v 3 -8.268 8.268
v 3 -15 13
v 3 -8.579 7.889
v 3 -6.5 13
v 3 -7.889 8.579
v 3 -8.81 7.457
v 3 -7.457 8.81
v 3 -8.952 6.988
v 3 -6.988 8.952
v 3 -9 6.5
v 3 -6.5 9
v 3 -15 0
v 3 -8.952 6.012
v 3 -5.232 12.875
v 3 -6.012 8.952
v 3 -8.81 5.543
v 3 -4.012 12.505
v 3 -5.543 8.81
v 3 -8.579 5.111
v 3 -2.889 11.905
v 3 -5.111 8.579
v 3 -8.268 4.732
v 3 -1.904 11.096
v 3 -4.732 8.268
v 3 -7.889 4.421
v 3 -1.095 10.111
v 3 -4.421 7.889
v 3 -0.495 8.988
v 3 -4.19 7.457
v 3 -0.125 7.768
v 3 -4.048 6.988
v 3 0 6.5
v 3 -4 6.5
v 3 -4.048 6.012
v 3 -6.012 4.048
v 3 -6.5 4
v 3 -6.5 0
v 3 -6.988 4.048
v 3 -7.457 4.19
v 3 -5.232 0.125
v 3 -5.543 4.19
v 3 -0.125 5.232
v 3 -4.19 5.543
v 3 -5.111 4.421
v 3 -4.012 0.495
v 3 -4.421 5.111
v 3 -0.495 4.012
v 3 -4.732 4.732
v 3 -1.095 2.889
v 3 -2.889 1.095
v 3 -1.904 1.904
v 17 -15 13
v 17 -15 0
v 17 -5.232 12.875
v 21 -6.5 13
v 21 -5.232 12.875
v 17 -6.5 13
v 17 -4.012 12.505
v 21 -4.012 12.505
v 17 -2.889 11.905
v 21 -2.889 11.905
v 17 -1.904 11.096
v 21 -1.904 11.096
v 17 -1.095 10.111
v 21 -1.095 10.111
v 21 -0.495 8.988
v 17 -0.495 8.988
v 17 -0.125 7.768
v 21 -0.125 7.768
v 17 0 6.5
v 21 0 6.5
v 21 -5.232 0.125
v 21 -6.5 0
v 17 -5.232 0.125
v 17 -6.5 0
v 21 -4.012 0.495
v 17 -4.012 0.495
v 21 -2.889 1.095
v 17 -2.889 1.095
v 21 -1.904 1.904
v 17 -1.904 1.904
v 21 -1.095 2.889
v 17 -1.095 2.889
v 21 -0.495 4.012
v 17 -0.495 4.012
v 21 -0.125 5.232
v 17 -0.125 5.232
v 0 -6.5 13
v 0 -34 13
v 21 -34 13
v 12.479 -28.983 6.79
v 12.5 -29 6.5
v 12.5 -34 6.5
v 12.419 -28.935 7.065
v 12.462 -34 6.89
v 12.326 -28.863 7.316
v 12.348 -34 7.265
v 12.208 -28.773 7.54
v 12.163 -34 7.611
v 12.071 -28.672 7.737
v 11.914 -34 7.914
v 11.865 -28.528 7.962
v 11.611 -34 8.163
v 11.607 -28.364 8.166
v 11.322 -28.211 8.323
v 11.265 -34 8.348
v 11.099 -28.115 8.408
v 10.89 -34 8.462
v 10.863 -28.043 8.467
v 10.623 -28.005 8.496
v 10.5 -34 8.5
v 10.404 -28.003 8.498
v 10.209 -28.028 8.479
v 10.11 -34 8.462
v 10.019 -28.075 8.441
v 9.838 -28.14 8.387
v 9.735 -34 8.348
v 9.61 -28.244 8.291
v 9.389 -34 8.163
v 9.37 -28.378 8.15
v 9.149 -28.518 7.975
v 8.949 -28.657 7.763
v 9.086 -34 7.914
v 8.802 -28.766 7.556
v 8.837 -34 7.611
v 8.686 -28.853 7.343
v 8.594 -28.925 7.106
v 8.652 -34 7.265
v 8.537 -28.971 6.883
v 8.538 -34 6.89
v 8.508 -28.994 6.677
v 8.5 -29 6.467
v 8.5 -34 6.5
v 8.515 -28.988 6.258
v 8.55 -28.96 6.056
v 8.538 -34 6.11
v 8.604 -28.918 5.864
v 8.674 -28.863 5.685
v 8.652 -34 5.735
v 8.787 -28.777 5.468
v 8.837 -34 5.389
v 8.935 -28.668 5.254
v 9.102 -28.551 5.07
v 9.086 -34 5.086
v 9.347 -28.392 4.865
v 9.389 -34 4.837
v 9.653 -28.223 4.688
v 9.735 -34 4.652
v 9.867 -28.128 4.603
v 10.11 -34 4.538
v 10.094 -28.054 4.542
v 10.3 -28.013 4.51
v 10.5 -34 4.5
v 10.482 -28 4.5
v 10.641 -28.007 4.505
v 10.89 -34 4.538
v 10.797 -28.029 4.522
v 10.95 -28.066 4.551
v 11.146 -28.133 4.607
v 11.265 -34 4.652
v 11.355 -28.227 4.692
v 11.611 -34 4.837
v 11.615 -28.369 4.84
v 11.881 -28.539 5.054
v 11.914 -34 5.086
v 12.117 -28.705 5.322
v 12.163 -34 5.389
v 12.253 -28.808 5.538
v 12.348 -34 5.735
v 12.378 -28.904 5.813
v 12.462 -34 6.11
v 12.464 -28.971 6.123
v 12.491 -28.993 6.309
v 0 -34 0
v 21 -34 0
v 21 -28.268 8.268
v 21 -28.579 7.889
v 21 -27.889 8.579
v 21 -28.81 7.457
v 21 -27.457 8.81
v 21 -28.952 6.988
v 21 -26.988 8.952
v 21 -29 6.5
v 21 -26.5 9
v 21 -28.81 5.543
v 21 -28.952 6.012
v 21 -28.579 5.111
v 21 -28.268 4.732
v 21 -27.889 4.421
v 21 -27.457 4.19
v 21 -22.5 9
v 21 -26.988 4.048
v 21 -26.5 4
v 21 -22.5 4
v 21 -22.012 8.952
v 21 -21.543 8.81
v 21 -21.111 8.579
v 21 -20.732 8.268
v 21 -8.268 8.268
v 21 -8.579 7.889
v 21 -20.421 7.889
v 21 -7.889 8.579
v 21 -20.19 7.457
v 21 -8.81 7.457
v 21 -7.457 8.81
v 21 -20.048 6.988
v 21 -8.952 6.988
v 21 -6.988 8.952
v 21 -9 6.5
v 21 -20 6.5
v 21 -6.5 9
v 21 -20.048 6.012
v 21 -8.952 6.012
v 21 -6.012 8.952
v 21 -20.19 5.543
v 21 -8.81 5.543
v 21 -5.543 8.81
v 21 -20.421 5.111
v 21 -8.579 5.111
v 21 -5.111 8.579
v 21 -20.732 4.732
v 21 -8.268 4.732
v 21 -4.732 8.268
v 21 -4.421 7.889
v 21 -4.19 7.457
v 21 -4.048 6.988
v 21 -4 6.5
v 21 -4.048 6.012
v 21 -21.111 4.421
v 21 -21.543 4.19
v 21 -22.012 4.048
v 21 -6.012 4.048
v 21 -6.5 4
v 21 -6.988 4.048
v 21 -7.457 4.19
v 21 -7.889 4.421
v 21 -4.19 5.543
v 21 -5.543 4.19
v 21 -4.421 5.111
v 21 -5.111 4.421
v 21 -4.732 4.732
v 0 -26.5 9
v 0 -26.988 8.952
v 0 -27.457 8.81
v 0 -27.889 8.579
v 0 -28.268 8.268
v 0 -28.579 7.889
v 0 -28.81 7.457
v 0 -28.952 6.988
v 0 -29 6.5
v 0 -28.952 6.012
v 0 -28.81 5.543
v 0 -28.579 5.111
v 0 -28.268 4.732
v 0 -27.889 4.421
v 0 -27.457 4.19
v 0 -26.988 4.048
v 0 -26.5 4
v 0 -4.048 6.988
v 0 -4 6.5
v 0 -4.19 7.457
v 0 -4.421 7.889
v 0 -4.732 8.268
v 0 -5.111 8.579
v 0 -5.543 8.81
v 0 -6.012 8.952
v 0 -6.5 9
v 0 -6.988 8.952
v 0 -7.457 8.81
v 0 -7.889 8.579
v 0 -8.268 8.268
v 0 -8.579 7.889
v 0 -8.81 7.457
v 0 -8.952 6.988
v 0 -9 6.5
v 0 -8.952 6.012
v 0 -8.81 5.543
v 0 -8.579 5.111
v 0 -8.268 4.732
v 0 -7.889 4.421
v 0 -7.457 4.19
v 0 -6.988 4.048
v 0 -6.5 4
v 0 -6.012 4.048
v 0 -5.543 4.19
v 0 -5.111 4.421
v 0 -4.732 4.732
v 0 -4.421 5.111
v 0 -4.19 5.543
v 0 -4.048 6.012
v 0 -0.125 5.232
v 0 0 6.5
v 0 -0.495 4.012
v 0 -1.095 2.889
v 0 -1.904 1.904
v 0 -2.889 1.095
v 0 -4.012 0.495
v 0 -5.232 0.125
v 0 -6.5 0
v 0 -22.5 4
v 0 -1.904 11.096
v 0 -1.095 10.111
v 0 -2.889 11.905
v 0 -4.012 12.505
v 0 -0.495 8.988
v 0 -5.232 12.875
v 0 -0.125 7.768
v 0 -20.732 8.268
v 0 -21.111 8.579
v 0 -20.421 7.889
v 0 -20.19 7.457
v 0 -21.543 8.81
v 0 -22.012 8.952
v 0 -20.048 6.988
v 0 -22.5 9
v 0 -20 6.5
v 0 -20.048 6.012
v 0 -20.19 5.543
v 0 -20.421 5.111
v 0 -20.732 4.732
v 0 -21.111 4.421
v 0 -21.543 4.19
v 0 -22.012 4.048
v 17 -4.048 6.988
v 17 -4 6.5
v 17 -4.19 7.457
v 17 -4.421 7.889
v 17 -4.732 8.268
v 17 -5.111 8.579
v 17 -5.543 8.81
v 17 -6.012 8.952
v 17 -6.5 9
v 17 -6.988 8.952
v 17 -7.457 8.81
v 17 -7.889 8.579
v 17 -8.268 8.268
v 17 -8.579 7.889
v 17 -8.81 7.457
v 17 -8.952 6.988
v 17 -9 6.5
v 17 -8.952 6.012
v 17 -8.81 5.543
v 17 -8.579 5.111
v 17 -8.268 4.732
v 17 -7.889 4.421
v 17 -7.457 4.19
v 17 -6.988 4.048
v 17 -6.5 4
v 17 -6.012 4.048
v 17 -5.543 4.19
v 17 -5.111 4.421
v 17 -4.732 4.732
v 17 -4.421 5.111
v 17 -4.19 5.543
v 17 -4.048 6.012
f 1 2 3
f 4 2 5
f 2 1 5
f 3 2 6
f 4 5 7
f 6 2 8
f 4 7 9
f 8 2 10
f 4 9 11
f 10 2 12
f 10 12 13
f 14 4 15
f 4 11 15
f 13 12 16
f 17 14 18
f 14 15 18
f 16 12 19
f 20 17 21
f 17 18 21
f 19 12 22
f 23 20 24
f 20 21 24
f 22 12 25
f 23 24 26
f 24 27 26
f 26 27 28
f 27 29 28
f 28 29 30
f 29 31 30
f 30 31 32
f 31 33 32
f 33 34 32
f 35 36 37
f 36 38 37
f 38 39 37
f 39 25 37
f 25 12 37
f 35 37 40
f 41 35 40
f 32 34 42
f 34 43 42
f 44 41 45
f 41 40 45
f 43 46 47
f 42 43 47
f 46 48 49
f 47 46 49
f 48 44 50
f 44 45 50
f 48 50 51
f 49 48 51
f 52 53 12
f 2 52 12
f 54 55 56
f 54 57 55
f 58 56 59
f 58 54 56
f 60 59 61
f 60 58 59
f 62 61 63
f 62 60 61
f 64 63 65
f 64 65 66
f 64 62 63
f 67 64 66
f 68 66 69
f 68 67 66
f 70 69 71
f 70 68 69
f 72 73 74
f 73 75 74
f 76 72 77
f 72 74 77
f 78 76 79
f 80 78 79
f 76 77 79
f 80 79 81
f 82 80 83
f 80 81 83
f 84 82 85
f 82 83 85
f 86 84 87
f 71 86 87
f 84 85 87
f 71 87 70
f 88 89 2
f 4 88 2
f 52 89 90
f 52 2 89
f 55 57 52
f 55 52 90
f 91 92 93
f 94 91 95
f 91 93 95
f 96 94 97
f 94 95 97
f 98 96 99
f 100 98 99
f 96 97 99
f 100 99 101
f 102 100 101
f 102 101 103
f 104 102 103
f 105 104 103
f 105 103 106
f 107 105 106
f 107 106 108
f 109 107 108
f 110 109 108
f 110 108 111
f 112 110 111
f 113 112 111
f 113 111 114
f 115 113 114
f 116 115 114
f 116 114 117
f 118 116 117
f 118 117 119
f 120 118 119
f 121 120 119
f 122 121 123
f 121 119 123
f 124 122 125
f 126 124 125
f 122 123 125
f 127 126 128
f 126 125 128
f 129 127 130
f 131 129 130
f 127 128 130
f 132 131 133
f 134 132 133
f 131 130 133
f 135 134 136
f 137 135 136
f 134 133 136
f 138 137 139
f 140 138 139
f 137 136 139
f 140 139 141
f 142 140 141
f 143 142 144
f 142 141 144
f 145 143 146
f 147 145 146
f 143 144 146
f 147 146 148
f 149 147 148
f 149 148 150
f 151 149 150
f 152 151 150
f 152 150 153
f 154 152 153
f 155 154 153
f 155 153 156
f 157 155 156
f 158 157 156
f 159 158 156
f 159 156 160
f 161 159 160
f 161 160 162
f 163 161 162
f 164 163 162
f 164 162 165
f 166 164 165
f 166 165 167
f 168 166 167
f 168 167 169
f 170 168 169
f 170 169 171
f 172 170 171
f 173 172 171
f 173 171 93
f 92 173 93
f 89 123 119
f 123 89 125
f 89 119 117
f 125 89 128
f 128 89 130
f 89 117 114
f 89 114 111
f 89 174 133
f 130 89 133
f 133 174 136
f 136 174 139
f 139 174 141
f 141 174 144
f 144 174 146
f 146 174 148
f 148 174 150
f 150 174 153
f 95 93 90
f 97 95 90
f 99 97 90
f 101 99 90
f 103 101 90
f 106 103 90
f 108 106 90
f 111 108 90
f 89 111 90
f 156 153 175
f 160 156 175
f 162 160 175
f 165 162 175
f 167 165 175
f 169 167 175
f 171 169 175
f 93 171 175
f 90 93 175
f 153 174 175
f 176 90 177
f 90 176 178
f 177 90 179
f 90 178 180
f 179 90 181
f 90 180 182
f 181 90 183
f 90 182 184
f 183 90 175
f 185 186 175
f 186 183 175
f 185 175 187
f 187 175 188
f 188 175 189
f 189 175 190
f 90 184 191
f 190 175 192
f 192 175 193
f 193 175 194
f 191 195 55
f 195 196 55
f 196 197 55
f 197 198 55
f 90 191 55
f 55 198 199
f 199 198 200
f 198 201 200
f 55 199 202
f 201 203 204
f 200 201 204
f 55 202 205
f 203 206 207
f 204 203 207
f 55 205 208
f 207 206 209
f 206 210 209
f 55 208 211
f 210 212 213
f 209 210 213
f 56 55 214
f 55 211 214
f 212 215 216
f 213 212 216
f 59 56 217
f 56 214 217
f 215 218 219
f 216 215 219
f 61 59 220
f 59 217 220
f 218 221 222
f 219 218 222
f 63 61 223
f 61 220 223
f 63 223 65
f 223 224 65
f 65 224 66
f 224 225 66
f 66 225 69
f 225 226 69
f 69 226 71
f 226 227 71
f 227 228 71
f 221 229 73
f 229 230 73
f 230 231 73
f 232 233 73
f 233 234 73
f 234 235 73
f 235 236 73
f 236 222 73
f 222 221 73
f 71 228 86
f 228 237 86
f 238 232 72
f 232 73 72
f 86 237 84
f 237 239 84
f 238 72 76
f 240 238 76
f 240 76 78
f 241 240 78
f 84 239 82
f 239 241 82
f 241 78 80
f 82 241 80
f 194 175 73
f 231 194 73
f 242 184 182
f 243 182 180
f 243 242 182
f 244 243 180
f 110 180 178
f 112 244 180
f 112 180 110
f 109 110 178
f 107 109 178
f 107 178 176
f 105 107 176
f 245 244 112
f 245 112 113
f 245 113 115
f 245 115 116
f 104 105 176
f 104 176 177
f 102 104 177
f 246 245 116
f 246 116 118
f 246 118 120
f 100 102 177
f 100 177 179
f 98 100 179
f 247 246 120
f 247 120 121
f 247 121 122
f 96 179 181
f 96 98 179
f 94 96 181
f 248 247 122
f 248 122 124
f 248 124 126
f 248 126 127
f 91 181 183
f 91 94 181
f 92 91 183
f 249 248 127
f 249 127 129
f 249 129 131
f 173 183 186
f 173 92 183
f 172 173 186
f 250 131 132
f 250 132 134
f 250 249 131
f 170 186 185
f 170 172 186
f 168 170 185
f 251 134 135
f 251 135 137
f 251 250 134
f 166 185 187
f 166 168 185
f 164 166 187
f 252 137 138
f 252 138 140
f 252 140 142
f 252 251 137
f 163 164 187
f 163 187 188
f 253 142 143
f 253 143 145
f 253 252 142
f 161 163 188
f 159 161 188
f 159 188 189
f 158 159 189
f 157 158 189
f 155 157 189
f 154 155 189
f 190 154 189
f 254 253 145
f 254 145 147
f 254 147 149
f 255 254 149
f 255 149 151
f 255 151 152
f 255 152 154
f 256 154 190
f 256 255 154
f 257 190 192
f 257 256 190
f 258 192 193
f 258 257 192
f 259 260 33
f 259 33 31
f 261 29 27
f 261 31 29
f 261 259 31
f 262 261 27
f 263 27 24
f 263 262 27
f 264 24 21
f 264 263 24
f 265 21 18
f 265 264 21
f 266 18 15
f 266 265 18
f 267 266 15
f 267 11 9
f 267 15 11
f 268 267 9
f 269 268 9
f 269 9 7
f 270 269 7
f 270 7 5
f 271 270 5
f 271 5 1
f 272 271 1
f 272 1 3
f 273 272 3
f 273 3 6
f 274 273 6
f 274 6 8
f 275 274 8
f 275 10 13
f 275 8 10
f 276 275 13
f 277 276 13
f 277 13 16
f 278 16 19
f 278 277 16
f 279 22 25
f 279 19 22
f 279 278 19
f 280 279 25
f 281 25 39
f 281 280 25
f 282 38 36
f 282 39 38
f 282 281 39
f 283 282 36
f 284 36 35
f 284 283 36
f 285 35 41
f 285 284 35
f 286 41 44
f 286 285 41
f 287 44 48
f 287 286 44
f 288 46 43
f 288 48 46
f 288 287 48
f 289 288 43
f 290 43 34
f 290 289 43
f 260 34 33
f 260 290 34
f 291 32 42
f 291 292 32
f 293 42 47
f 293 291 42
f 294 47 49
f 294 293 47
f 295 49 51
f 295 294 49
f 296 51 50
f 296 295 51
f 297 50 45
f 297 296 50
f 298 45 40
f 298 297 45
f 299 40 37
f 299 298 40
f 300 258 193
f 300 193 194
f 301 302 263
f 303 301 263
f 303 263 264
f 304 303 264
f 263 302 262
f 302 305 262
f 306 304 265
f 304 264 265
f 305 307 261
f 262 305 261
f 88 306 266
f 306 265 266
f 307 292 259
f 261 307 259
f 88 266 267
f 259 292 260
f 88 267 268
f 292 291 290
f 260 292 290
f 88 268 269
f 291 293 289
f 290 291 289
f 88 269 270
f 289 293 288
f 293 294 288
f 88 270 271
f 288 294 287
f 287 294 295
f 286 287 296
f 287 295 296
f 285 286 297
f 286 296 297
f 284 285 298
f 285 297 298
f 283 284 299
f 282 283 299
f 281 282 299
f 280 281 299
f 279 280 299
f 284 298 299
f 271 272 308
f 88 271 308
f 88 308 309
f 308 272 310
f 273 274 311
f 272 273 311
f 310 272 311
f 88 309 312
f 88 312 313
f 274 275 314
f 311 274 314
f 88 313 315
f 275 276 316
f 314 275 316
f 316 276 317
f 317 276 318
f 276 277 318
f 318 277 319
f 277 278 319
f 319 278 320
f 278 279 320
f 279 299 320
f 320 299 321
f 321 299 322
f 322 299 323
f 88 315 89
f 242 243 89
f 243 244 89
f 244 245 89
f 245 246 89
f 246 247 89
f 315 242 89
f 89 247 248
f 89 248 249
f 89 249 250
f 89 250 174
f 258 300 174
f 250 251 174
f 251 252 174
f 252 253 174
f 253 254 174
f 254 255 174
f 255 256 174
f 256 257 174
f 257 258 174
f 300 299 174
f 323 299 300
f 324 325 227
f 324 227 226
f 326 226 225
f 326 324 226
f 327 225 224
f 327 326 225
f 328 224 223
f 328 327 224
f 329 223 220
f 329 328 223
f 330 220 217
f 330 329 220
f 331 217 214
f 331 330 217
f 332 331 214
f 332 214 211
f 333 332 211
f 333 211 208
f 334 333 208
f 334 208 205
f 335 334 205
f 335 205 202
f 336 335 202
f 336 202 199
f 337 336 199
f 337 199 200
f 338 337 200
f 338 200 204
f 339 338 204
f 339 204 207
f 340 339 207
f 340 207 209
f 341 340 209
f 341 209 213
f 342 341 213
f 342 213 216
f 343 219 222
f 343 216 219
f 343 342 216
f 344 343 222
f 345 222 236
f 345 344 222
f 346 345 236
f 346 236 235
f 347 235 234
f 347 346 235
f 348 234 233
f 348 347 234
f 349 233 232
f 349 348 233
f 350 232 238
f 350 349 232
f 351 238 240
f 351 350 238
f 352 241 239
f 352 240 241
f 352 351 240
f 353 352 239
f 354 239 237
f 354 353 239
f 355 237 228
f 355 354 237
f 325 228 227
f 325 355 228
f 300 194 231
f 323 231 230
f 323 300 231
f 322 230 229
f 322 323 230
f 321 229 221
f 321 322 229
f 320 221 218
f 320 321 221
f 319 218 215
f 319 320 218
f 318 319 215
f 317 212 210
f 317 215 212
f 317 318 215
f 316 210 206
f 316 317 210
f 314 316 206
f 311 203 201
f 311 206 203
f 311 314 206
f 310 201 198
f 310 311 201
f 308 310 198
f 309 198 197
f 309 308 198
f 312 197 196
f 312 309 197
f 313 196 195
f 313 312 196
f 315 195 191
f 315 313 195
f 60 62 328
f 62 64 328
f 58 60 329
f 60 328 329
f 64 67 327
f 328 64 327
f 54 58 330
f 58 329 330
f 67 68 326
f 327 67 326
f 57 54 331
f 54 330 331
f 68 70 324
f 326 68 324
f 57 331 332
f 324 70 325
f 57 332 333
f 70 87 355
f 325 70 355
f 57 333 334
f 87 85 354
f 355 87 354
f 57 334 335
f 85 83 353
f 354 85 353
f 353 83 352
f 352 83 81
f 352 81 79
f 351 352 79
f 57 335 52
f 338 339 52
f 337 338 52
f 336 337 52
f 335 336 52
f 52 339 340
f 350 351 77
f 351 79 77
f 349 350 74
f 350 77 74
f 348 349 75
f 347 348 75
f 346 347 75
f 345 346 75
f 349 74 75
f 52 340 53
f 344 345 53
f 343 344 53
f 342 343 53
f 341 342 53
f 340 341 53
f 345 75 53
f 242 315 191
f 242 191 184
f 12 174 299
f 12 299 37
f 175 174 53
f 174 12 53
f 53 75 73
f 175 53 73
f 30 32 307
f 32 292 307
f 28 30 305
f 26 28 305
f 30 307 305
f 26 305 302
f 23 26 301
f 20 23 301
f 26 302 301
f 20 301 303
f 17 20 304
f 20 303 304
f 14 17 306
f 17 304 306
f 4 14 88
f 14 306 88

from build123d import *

# Parameters (mm, degrees)
BOSS_EXTRUDE1_DEPTH     = 13
CUT_EXTRUDE1_DEPTH      = 43.023802779
CUT_EXTRUDE2_DEPTH      = 43.023802779
CUT_EXTRUDE2_DEPTH_BACK = 43.023802779
SKETCH5_R               = 2.5
FILLET1_R               = 6.5
SKETCH6_R               = 2
CUT_EXTRUDE3_DEPTH      = 8


with BuildPart() as part:
    # Sketch2 → Boss-Extrude1 (new body)
    with BuildSketch(Plane.XY):
        Polygon((0, 0), (0, -34), (21, -34), (21, 0), (17, 0), (17, -15), (3, -15), (3, 0), align=None)
    extrude(amount=BOSS_EXTRUDE1_DEPTH)

    # Sketch4 → Cut-Extrude1 (cut, through all)
    with BuildSketch(Plane.ZY):
        with BuildLine():
            Line((4, -26.5), (4, -22.5))
            ThreePointArc((4, -22.5), (6.5, -20), (9, -22.5))
            Line((9, -22.5), (9, -26.5))
            ThreePointArc((9, -26.5), (6.5, -29), (4, -26.5))
        make_face()
    extrude(amount=-CUT_EXTRUDE1_DEPTH, mode=Mode.SUBTRACT)

    # Sketch5 → Cut-Extrude2 (cut, two sides: drawn at the far end of the back side and taken through both)
    with BuildSketch(Plane(origin=(21, 0, 0), x_dir=(0, 0, -1), z_dir=(1, 0, 0)).offset(-CUT_EXTRUDE2_DEPTH_BACK)):
        with Locations(Location((-6.5, -6.5, 0), (0, 0, 90))):
            Circle(SKETCH5_R)
    extrude(amount=CUT_EXTRUDE2_DEPTH + CUT_EXTRUDE2_DEPTH_BACK, mode=Mode.SUBTRACT)

    # Fillet1
    fillet1_edges = [part.edges().sort_by_distance(p)[0] for p in [
        (19, 0, 13),
        (1.5, 0, 13),
        (1.5, 0, 0),
        (19, 0, 0),
    ]]
    fillet(fillet1_edges, radius=FILLET1_R - 0.0001)  # a hair under: the kernel refuses the full size

    # Sketch6 → Cut-Extrude3 (cut)
    with BuildSketch(Plane.XZ.offset(34)):
        with Locations((10.5, 6.5)):
            Circle(SKETCH6_R)
    extrude(amount=-CUT_EXTRUDE3_DEPTH, mode=Mode.SUBTRACT)


solid = part.part
